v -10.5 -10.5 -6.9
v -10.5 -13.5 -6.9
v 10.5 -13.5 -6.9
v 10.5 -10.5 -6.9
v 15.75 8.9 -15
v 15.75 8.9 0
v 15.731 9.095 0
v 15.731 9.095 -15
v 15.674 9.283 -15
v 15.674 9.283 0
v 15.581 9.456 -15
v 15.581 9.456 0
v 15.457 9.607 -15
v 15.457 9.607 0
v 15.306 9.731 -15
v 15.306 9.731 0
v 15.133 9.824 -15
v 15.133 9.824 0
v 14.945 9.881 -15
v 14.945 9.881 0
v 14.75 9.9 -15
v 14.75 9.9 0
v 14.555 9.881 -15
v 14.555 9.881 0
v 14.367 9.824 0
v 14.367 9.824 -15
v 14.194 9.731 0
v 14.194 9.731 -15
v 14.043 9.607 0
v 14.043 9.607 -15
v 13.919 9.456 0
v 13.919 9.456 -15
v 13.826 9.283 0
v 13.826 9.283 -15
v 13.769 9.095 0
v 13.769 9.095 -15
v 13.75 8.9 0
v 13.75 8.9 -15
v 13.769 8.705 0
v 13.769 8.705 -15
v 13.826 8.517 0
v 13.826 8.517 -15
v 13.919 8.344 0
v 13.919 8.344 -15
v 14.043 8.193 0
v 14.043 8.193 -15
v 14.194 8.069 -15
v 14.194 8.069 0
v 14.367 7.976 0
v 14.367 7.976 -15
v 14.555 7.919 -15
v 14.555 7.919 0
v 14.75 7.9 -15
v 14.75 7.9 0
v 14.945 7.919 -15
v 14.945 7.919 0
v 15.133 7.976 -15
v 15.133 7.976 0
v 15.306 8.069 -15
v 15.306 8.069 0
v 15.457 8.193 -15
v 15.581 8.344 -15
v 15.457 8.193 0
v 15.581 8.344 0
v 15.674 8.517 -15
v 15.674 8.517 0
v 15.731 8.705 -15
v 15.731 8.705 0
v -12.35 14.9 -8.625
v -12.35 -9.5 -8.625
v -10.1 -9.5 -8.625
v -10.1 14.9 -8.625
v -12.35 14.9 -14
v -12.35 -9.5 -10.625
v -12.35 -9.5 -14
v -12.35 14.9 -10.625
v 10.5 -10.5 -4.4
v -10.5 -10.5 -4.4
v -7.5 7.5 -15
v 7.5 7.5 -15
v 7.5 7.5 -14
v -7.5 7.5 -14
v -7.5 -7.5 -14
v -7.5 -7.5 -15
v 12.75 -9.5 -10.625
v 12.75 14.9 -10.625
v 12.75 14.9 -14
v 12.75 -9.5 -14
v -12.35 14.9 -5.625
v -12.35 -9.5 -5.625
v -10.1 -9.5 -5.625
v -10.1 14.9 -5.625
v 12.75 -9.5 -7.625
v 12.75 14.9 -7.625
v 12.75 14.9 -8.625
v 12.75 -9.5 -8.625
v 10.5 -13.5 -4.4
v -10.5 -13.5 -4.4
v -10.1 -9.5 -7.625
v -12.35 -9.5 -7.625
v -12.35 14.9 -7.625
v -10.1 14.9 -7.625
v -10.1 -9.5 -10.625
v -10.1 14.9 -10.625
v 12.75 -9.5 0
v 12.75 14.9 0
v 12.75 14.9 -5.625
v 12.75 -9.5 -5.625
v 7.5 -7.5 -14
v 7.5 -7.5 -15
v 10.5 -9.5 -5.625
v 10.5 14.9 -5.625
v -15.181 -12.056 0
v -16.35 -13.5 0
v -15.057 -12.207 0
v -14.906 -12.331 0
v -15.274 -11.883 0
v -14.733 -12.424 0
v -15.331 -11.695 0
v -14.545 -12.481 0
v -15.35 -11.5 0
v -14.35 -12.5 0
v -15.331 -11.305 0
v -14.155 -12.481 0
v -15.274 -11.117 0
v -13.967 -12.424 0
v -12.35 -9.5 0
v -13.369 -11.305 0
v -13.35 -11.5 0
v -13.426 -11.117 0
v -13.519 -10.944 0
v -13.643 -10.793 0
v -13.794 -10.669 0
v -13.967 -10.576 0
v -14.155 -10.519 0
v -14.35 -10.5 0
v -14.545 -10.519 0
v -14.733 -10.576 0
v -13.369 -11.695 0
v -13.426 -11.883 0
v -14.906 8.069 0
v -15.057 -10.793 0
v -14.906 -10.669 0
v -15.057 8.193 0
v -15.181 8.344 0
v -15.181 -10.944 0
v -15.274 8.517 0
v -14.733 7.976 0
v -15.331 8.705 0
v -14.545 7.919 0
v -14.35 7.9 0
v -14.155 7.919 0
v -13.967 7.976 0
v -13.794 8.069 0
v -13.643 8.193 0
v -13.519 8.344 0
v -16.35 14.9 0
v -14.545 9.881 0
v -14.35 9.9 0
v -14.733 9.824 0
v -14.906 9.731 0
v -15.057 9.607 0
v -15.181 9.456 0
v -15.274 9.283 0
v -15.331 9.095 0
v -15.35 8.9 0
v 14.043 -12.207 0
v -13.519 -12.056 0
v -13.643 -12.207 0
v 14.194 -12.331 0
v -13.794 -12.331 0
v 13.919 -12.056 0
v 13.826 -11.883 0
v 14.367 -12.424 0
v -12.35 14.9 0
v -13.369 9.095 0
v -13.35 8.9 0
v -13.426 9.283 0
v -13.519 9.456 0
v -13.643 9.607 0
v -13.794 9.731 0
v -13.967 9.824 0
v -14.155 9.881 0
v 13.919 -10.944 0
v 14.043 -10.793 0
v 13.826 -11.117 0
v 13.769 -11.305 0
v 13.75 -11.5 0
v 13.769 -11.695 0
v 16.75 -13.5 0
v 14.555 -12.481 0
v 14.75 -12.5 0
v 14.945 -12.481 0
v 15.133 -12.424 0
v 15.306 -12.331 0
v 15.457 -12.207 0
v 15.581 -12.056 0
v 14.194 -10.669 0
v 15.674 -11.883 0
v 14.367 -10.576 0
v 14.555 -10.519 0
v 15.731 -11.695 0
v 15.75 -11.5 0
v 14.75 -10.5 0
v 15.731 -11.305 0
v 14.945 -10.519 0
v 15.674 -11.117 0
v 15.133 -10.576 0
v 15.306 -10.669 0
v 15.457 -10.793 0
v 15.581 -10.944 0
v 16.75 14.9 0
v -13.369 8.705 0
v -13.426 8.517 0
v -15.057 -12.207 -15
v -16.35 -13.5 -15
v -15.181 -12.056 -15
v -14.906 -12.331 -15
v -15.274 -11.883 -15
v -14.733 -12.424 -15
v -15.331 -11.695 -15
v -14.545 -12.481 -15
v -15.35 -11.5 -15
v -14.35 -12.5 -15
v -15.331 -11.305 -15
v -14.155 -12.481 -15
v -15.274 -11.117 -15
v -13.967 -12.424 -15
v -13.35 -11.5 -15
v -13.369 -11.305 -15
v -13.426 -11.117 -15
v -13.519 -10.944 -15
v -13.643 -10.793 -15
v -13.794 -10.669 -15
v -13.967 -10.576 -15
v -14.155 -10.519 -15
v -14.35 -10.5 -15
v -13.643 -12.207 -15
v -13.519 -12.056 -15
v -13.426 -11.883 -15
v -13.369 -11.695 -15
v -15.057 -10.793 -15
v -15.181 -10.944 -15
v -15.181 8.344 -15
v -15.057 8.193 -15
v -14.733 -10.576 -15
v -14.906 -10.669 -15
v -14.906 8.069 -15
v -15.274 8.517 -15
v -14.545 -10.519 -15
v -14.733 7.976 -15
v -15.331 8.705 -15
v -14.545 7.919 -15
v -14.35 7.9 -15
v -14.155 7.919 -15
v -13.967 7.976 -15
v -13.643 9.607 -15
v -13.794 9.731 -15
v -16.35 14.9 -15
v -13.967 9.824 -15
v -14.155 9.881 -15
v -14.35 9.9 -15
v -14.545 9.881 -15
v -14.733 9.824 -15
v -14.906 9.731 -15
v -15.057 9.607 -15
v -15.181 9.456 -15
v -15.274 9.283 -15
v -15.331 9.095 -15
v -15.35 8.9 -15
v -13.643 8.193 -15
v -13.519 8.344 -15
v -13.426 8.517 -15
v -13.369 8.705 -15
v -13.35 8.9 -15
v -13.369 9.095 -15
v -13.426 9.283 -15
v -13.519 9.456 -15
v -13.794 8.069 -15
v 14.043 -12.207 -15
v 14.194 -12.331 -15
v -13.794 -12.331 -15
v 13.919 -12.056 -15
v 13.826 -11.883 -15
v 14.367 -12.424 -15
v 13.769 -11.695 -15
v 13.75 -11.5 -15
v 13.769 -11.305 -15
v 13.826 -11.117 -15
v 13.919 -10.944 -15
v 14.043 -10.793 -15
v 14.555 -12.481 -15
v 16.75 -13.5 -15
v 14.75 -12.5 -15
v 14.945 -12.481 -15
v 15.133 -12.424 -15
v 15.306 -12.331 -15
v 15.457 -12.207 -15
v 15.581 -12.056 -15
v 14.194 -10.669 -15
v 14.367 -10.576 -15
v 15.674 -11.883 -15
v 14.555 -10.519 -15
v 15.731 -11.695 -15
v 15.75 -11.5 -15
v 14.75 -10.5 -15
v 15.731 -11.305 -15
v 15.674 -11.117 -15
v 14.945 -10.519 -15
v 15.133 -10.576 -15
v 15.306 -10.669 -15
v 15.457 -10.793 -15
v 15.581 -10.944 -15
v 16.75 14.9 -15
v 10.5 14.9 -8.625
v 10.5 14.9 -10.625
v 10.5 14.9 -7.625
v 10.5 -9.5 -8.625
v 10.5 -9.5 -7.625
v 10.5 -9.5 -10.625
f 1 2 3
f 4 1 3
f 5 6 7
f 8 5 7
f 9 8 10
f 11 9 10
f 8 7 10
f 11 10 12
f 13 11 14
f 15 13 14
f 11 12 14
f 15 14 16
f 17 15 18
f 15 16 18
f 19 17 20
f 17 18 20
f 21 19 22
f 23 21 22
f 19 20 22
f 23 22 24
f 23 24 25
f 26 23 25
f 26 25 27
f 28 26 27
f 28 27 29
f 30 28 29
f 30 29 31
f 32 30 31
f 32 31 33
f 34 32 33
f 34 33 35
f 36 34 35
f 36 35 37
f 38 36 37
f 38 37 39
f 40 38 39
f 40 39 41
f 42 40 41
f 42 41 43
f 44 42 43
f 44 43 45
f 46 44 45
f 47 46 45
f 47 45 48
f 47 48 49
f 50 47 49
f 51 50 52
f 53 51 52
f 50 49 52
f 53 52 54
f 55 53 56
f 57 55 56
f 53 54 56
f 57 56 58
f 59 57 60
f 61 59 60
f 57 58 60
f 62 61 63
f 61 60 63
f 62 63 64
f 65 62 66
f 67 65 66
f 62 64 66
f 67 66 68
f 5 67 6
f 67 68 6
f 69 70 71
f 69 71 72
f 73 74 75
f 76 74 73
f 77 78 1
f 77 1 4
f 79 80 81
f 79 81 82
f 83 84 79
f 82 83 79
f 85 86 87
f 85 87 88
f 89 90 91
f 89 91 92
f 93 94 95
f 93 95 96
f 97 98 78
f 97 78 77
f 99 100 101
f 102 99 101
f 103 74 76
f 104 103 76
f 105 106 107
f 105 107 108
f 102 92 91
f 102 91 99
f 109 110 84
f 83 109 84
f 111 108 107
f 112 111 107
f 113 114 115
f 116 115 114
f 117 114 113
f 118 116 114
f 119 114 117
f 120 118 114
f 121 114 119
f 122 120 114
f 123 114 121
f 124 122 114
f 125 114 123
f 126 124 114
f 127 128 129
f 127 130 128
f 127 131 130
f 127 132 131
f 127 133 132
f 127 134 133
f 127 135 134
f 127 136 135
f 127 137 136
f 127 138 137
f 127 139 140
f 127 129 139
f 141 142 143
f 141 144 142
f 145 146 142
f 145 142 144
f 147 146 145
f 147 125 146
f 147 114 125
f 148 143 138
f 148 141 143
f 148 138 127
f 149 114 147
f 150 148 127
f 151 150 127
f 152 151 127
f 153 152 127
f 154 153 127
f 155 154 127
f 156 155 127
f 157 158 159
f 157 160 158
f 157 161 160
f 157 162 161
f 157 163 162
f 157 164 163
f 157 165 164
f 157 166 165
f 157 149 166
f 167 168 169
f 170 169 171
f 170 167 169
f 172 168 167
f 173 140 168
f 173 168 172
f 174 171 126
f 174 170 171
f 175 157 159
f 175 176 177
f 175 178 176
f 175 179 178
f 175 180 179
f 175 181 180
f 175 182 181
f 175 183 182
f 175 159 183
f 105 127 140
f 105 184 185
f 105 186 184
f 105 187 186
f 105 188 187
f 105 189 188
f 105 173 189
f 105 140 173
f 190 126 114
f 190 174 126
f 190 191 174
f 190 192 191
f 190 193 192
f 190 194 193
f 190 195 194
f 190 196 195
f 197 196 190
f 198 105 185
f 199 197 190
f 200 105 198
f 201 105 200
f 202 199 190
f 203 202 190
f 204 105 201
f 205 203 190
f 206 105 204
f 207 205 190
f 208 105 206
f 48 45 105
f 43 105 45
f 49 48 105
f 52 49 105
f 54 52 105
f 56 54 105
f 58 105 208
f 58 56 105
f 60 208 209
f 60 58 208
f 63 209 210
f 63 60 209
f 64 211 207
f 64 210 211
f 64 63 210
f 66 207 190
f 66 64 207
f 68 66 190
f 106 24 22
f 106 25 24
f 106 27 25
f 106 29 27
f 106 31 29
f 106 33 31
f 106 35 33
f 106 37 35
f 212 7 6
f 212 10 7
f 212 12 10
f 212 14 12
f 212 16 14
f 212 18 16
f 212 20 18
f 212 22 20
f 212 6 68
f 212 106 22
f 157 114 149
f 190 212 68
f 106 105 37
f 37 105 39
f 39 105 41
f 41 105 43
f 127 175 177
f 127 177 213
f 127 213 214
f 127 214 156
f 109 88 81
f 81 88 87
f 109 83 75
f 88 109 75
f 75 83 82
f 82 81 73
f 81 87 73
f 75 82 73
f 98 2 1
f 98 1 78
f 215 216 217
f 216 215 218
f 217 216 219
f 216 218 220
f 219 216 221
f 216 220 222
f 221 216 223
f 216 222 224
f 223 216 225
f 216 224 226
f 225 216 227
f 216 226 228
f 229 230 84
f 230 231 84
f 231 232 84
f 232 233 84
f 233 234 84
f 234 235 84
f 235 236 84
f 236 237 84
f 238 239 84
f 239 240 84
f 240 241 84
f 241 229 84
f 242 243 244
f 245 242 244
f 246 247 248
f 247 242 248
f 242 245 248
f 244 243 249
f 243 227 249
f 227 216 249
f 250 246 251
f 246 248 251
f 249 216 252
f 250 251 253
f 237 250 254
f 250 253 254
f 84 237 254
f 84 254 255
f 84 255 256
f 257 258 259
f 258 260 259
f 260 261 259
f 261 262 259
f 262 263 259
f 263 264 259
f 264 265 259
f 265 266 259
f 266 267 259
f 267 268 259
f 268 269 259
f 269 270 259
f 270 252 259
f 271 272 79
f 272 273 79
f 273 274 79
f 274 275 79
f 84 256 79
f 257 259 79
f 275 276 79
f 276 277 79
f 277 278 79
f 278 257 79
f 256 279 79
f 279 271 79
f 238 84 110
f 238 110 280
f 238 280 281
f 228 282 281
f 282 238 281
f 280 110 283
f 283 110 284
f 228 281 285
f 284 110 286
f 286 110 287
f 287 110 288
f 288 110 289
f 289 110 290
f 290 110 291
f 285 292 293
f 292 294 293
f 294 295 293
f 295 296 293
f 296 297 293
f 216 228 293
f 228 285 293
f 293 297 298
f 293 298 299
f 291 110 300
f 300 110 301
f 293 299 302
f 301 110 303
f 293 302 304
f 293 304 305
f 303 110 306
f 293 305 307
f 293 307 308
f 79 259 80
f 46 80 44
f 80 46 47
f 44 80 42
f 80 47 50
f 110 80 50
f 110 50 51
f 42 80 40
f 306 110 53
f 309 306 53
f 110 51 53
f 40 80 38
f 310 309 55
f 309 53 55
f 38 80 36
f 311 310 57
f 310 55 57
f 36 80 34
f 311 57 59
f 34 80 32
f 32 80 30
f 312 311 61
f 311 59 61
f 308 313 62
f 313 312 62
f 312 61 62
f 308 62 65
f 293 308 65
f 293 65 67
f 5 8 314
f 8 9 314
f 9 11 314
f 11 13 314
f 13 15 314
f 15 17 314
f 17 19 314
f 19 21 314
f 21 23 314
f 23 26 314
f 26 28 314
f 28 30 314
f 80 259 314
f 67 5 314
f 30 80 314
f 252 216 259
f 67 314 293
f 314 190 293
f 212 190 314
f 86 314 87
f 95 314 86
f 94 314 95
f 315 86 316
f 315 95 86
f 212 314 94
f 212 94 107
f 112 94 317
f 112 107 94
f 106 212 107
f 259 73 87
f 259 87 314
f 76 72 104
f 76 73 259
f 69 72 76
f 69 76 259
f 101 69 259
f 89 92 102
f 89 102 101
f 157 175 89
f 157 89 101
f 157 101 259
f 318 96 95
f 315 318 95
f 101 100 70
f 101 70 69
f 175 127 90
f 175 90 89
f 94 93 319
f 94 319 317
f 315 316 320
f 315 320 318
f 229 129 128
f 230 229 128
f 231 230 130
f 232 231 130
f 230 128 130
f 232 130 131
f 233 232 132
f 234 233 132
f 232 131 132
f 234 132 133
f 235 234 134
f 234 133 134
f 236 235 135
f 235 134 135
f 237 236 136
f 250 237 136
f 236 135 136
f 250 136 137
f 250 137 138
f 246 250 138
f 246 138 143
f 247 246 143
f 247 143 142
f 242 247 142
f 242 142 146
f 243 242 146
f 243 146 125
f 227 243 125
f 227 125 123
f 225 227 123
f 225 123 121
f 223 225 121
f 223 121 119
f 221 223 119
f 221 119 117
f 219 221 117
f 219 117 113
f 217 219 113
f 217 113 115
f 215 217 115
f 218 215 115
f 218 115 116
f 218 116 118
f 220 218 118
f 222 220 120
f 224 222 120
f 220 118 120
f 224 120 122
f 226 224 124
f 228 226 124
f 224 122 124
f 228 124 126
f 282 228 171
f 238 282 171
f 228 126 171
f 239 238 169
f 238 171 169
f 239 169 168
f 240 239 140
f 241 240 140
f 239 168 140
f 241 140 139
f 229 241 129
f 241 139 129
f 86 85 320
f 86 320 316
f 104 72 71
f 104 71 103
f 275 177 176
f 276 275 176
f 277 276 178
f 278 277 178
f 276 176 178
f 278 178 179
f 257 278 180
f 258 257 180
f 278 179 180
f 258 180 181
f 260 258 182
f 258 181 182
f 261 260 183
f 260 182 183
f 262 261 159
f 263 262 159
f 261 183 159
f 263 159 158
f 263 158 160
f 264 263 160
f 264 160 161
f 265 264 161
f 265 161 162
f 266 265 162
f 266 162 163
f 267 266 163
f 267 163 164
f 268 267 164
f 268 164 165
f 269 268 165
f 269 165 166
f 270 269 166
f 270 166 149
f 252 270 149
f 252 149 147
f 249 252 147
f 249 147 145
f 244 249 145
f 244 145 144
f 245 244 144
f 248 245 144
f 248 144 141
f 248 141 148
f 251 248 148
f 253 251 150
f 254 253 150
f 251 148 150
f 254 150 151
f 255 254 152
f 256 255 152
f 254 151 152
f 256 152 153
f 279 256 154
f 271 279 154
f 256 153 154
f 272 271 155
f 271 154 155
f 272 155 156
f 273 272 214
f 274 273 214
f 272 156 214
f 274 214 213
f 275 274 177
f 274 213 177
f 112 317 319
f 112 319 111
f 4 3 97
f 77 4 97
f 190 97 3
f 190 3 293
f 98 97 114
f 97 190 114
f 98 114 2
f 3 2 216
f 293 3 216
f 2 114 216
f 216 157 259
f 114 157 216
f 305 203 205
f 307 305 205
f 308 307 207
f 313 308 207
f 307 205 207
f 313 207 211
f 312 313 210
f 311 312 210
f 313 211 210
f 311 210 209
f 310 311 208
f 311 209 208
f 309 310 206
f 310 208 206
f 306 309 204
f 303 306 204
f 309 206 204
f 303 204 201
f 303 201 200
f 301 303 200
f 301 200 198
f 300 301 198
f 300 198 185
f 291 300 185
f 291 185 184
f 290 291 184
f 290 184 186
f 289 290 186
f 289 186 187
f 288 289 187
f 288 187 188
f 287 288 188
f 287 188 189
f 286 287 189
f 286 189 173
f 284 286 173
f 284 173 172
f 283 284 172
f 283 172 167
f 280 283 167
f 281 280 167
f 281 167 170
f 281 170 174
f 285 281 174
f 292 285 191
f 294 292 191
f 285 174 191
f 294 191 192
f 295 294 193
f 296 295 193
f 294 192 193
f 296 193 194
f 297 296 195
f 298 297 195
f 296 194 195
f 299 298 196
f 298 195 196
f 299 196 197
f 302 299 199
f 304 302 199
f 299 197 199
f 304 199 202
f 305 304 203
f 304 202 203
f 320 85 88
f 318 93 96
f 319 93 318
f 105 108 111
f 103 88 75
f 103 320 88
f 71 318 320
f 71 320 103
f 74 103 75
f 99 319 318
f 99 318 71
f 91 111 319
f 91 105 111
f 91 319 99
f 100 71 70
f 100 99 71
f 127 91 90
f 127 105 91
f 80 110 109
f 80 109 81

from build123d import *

# Parameters (mm, degrees)
ESQUISSE1_R             = 37
ESQUISSE1_R_2           = 1.5
ESQUISSE1_W             = 25
ESQUISSE1_H             = 3
BOSS_EXTRU_1_DEPTH      = 2
BOSS_EXTRU_2_DEPTH      = 15
ESQUISSE3_W             = 2
ESQUISSE3_H             = 28.4
BOSS_EXTRU_3_DEPTH      = 2.25
ESQUISSE5_W             = 2
ESQUISSE5_H             = 24.4
BOSS_EXTRU_4_DEPTH      = 2.25
ESQUISSE7_W             = 33.1
ESQUISSE7_H             = 28.4
BOSS_EXTRU_5_DEPTH      = 1
ESQUISSE8_W             = 15
ESQUISSE8_H             = 15
ENL_V_MAT_EXTRU_1_DEPTH = 3
ESQUISSE9_W             = 21
ESQUISSE9_H             = 2.5
ENL_V_MAT_EXTRU_2_DEPTH = 3
ESQUISSE10_R            = 1
ENL_V_MAT_EXTRU_3_DEPTH = 19
ENL_V_START             = -2
ESQUISSE11_R            = 37
ENL_V_MAT_EXTRU_4_DEPTH = 2


with BuildPart() as part:
    # Esquisse1 → Boss.-Extru.1 (new body)
    with BuildSketch(Plane.XY):
        Circle(ESQUISSE1_R)
        with Locations((0, 30)):
            Circle(ESQUISSE1_R_2, mode=Mode.SUBTRACT)
        with Locations((-22.874807889, 14.34375)):
            Circle(ESQUISSE1_R_2, mode=Mode.SUBTRACT)
        with Locations((-25.416453209, -15.9375)):
            Circle(ESQUISSE1_R_2, mode=Mode.SUBTRACT)
        with Locations((0, -27)):
            Circle(ESQUISSE1_R_2, mode=Mode.SUBTRACT)
        with Locations((25.416453209, -15.9375)):
            Circle(ESQUISSE1_R_2, mode=Mode.SUBTRACT)
        with Locations((22.874807889, 14.34375)):
            Circle(ESQUISSE1_R_2, mode=Mode.SUBTRACT)
        with Locations((0, -15.5)):
            Rectangle(ESQUISSE1_W, ESQUISSE1_H, mode=Mode.SUBTRACT)
    extrude(amount=BOSS_EXTRU_1_DEPTH)

    # Esquisse2 → Boss.-Extru.2 (add)
    with BuildSketch(Plane(origin=(0, 0, 0), x_dir=(-1, 0, 0), z_dir=(0, 0, -1))):
        Polygon((-16.75, 14.9), (-12.75, 14.9), (-12.75, -9.5), (12.35, -9.5), (12.35, 14.9), (16.35, 14.9), (16.35, -13.5), (-16.75, -13.5), align=None)
    extrude(amount=BOSS_EXTRU_2_DEPTH)

    # Esquisse3 → Boss.-Extru.3 (add)
    with BuildSketch(Plane(origin=(-12.35, 0, 0), x_dir=(0, 0, -1), z_dir=(1, 0, 0))):
        with Locations((9.625, 0.7)):
            Rectangle(ESQUISSE3_W, ESQUISSE3_H)
        with Locations((6.625, 0.7)):
            Rectangle(ESQUISSE3_W, ESQUISSE3_H)
    extrude(amount=BOSS_EXTRU_3_DEPTH)

    # Esquisse5 → Boss.-Extru.4 (add)
    with BuildSketch(Plane.ZY.offset(-12.75)):
        with Locations((-9.625, 2.7)):
            Rectangle(ESQUISSE5_W, ESQUISSE5_H)
        with Locations((-6.625, 2.7)):
            Rectangle(ESQUISSE5_W, ESQUISSE5_H)
    extrude(amount=BOSS_EXTRU_4_DEPTH)

    # Esquisse7 → Boss.-Extru.5 (add)
    with BuildSketch(Plane(origin=(0, 0, -15), x_dir=(-1, 0, 0), z_dir=(0, 0, -1))):
        with Locations((-0.2, 0.7)):
            Rectangle(ESQUISSE7_W, ESQUISSE7_H)
    extrude(amount=-BOSS_EXTRU_5_DEPTH)

    # Esquisse8 → Enlèv. mat.-Extru.1 (cut)
    with BuildSketch(Plane(origin=(0, 0, -15), x_dir=(-1, 0, 0), z_dir=(0, 0, -1))):
        Rectangle(ESQUISSE8_W, ESQUISSE8_H)
    extrude(amount=-ENL_V_MAT_EXTRU_1_DEPTH, mode=Mode.SUBTRACT)

    # Esquisse9 → Enlèv. mat.-Extru.2 (cut)
    with BuildSketch(Plane.XZ.offset(13.5)):
        with Locations((0, -5.65)):
            Rectangle(ESQUISSE9_W, ESQUISSE9_H)
    extrude(amount=-ENL_V_MAT_EXTRU_2_DEPTH, mode=Mode.SUBTRACT)

    # Esquisse10 → Enlèv. mat.-Extru.3 (cut)
    with BuildSketch(Plane.XY.offset(2)):
        with Locations((-14.35, 8.9)):
            Circle(ESQUISSE10_R)
        with Locations((-14.35, -11.5)):
            Circle(ESQUISSE10_R)
        with Locations((14.75, -11.5)):
            Circle(ESQUISSE10_R)
        with Locations((14.75, 8.9)):
            Circle(ESQUISSE10_R)
    extrude(amount=-ENL_V_MAT_EXTRU_3_DEPTH, mode=Mode.SUBTRACT)

    # Esquisse11 → Enlèv. mat.-Extru.4 (cut)
    with BuildSketch(Plane.XY.offset(2).offset(ENL_V_START)):
        Circle(ESQUISSE11_R)
    extrude(amount=ENL_V_MAT_EXTRU_4_DEPTH, mode=Mode.SUBTRACT)


solid = part.part
